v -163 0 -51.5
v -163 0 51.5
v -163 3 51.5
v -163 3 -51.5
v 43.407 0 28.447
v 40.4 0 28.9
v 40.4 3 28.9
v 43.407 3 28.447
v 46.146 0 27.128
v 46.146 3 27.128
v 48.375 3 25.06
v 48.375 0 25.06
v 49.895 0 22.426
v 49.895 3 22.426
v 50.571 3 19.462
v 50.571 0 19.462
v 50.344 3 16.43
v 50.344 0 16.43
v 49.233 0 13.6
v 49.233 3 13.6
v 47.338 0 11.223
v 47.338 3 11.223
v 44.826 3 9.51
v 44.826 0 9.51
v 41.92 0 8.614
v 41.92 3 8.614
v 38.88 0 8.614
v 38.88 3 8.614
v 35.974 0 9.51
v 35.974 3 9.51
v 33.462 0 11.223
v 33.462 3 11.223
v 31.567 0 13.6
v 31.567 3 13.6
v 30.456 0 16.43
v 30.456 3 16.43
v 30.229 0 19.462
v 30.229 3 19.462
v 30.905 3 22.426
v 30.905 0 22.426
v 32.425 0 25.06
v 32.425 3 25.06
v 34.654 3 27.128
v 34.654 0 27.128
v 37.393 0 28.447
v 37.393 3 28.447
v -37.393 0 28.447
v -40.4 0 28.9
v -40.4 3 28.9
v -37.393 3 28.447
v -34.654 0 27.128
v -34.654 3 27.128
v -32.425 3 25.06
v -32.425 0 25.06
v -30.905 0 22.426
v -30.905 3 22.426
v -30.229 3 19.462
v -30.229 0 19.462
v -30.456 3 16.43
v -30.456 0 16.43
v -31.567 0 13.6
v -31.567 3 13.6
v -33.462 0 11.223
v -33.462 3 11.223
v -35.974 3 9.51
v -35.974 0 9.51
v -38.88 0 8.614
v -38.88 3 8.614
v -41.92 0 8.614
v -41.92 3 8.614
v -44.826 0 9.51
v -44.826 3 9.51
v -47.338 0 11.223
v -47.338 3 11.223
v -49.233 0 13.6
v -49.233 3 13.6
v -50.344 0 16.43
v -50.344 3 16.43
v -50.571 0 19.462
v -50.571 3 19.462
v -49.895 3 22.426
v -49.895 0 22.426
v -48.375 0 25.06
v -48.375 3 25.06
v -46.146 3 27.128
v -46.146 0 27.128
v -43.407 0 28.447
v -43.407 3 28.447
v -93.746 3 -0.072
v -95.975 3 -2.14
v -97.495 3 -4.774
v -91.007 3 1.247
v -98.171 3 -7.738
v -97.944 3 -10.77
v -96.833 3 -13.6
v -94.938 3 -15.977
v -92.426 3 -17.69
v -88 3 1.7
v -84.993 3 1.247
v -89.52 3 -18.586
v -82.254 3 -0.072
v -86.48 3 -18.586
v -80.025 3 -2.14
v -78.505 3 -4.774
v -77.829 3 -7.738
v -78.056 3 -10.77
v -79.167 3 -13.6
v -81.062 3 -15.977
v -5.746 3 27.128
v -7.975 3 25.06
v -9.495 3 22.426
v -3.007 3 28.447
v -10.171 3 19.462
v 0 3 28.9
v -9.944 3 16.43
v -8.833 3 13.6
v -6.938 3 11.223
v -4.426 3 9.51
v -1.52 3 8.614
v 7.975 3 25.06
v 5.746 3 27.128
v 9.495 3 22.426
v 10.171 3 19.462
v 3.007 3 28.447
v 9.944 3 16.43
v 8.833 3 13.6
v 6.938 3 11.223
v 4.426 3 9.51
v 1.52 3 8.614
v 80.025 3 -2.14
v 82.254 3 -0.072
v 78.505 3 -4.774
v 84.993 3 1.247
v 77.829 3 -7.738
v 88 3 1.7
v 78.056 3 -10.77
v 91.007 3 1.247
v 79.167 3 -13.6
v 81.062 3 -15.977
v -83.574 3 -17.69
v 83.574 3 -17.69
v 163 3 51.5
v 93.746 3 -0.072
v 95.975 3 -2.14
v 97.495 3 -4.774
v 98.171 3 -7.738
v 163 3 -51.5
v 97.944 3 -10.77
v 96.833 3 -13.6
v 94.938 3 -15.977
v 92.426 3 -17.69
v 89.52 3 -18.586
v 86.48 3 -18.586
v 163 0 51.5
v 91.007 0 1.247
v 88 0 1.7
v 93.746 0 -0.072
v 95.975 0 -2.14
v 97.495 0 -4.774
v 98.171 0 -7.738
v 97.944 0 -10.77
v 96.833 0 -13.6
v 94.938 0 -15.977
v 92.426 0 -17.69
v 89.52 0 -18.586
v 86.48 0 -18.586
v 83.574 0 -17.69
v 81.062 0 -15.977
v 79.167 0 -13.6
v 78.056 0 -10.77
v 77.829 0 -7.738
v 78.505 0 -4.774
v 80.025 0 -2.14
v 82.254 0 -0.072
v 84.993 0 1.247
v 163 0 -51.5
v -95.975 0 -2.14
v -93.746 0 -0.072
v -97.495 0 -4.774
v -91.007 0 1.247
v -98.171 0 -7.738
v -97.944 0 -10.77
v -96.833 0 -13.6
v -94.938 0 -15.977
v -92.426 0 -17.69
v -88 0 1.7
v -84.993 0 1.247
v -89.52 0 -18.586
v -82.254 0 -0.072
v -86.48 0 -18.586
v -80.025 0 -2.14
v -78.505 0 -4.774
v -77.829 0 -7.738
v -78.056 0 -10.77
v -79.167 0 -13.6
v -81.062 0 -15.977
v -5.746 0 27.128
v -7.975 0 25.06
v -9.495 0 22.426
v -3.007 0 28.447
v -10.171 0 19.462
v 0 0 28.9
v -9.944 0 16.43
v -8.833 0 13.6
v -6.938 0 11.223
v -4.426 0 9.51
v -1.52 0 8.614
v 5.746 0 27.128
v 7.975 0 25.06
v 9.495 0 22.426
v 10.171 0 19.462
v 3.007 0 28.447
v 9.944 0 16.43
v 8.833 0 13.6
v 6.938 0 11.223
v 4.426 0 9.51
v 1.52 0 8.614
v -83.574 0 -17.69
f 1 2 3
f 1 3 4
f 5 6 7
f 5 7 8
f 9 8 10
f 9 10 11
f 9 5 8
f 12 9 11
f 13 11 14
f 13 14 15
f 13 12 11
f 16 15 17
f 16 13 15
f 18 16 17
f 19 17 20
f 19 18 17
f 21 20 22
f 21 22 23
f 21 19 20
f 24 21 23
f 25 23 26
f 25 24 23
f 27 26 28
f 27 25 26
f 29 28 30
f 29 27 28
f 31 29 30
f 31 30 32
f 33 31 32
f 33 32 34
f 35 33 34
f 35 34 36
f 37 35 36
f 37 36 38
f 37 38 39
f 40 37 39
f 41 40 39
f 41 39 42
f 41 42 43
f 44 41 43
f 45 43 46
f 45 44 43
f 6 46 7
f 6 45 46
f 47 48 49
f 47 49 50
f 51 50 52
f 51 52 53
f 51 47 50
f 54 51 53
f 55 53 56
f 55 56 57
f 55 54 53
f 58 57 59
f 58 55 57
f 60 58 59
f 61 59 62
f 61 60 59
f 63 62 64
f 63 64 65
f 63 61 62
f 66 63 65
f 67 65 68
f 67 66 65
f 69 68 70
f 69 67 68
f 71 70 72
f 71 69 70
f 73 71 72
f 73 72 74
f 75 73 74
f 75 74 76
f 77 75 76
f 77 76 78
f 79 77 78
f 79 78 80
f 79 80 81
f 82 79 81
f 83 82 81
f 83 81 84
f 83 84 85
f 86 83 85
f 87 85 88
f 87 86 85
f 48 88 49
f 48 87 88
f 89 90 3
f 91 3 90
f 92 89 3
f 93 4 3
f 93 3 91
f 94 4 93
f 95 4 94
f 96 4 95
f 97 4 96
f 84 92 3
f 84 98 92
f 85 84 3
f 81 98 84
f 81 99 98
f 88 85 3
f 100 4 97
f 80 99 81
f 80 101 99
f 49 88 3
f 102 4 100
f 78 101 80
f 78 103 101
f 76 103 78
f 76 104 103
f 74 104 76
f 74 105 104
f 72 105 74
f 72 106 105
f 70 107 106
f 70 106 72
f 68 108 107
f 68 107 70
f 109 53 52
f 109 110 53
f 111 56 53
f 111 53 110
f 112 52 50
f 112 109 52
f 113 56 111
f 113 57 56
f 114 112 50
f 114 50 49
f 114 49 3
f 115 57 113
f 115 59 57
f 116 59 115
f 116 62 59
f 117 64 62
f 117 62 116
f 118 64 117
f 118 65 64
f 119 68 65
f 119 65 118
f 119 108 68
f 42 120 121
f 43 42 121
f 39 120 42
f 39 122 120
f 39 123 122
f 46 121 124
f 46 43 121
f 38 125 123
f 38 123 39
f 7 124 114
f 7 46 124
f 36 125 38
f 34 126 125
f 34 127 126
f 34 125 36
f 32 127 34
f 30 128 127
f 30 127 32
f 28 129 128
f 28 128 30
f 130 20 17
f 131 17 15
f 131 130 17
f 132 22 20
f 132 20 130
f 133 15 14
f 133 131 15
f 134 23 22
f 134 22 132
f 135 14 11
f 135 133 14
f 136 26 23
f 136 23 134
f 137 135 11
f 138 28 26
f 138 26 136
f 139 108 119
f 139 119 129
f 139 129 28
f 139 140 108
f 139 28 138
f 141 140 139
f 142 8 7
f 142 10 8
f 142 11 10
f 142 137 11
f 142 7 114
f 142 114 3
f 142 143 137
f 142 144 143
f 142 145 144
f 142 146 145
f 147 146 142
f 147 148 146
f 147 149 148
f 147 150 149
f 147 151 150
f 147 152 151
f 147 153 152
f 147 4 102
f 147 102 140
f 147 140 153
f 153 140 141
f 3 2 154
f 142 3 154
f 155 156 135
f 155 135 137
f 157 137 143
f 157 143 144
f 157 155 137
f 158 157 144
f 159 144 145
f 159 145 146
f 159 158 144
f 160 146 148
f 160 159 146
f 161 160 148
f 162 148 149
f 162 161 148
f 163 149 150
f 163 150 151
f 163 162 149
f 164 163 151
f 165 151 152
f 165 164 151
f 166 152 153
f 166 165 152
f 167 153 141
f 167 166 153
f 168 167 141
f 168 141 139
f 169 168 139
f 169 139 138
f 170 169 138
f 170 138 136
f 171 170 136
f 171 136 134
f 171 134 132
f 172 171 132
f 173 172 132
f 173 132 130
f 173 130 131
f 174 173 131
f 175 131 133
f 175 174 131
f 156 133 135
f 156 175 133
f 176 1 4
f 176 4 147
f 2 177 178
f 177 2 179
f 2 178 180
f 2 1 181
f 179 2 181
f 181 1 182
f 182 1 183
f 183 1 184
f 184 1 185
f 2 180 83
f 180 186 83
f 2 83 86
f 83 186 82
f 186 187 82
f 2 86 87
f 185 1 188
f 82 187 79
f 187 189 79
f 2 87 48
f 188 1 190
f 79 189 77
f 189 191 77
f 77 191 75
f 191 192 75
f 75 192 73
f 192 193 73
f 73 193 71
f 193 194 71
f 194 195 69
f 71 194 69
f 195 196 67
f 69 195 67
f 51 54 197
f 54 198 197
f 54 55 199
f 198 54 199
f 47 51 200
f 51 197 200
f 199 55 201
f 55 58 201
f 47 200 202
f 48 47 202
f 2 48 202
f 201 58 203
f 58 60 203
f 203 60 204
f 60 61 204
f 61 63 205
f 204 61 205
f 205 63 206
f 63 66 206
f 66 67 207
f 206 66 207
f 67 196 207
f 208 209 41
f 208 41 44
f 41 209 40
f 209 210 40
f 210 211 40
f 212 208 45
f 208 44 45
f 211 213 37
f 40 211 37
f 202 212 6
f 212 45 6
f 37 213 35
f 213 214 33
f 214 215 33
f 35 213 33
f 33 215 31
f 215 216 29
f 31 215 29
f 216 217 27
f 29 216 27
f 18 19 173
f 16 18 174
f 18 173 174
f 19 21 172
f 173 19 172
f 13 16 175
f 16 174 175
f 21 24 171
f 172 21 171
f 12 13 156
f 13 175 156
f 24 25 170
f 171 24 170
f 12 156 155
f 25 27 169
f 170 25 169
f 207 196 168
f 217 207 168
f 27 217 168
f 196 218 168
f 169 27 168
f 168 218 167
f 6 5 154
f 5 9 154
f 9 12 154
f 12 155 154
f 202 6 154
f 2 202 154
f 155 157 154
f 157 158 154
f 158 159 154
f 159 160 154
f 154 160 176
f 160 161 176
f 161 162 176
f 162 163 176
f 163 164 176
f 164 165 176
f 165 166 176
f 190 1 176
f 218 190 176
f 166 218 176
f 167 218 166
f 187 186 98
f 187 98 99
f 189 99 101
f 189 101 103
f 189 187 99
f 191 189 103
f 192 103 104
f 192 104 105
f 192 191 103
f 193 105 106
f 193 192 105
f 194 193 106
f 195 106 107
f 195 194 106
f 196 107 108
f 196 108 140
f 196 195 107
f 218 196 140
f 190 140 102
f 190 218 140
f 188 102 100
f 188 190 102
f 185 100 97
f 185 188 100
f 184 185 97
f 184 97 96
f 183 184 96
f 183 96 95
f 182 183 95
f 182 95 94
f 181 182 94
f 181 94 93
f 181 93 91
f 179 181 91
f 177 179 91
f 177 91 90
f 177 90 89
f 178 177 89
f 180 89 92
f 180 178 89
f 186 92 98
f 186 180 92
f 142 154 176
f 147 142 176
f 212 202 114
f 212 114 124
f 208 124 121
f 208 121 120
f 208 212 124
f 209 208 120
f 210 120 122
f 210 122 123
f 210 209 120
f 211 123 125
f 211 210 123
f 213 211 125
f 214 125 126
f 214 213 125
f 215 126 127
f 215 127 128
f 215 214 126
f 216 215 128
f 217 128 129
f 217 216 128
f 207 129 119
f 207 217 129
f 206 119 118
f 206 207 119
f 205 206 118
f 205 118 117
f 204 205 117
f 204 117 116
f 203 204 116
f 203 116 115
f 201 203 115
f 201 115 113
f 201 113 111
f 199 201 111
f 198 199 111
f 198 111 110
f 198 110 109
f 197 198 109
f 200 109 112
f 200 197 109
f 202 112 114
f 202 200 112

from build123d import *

# Parameters (mm, degrees)
SKETCH2_W           = 326
SKETCH2_H           = 103
BOSS_EXTRUDE1_DEPTH = 3
CUT_EXTRUDE1_START  = -3
SKETCH3_R           = 10.2
CUT_EXTRUDE1_DEPTH  = 3


with BuildPart() as part:
    # Sketch2 → Boss-Extrude1 (new body)
    with BuildSketch(Plane(origin=(0, 0, 0), x_dir=(1, 0, 0), z_dir=(0, 1, 0))):
        Rectangle(SKETCH2_W, SKETCH2_H)
    extrude(amount=BOSS_EXTRUDE1_DEPTH)

    # Sketch3 → Cut-Extrude1 (cut)
    with BuildSketch(Plane(origin=(0, 3, 0), x_dir=(1, 0, 0), z_dir=(0, 1, 0)).offset(CUT_EXTRUDE1_START)):
        with Locations(Location((-88, 8.5, 0), (0, 0, 270))):
            Circle(SKETCH3_R)
        with Locations(Location((88, 8.5, 0), (0, 0, 270))):
            Circle(SKETCH3_R)
        with Locations(Location((-40.4, -18.7, 0), (0, 0, 270))):
            Circle(SKETCH3_R)
        with Locations(Location((0, -18.7, 0), (0, 0, 270))):
            Circle(SKETCH3_R)
        with Locations(Location((40.4, -18.7, 0), (0, 0, 270))):
            Circle(SKETCH3_R)
    extrude(amount=CUT_EXTRUDE1_DEPTH, mode=Mode.SUBTRACT)


solid = part.part
